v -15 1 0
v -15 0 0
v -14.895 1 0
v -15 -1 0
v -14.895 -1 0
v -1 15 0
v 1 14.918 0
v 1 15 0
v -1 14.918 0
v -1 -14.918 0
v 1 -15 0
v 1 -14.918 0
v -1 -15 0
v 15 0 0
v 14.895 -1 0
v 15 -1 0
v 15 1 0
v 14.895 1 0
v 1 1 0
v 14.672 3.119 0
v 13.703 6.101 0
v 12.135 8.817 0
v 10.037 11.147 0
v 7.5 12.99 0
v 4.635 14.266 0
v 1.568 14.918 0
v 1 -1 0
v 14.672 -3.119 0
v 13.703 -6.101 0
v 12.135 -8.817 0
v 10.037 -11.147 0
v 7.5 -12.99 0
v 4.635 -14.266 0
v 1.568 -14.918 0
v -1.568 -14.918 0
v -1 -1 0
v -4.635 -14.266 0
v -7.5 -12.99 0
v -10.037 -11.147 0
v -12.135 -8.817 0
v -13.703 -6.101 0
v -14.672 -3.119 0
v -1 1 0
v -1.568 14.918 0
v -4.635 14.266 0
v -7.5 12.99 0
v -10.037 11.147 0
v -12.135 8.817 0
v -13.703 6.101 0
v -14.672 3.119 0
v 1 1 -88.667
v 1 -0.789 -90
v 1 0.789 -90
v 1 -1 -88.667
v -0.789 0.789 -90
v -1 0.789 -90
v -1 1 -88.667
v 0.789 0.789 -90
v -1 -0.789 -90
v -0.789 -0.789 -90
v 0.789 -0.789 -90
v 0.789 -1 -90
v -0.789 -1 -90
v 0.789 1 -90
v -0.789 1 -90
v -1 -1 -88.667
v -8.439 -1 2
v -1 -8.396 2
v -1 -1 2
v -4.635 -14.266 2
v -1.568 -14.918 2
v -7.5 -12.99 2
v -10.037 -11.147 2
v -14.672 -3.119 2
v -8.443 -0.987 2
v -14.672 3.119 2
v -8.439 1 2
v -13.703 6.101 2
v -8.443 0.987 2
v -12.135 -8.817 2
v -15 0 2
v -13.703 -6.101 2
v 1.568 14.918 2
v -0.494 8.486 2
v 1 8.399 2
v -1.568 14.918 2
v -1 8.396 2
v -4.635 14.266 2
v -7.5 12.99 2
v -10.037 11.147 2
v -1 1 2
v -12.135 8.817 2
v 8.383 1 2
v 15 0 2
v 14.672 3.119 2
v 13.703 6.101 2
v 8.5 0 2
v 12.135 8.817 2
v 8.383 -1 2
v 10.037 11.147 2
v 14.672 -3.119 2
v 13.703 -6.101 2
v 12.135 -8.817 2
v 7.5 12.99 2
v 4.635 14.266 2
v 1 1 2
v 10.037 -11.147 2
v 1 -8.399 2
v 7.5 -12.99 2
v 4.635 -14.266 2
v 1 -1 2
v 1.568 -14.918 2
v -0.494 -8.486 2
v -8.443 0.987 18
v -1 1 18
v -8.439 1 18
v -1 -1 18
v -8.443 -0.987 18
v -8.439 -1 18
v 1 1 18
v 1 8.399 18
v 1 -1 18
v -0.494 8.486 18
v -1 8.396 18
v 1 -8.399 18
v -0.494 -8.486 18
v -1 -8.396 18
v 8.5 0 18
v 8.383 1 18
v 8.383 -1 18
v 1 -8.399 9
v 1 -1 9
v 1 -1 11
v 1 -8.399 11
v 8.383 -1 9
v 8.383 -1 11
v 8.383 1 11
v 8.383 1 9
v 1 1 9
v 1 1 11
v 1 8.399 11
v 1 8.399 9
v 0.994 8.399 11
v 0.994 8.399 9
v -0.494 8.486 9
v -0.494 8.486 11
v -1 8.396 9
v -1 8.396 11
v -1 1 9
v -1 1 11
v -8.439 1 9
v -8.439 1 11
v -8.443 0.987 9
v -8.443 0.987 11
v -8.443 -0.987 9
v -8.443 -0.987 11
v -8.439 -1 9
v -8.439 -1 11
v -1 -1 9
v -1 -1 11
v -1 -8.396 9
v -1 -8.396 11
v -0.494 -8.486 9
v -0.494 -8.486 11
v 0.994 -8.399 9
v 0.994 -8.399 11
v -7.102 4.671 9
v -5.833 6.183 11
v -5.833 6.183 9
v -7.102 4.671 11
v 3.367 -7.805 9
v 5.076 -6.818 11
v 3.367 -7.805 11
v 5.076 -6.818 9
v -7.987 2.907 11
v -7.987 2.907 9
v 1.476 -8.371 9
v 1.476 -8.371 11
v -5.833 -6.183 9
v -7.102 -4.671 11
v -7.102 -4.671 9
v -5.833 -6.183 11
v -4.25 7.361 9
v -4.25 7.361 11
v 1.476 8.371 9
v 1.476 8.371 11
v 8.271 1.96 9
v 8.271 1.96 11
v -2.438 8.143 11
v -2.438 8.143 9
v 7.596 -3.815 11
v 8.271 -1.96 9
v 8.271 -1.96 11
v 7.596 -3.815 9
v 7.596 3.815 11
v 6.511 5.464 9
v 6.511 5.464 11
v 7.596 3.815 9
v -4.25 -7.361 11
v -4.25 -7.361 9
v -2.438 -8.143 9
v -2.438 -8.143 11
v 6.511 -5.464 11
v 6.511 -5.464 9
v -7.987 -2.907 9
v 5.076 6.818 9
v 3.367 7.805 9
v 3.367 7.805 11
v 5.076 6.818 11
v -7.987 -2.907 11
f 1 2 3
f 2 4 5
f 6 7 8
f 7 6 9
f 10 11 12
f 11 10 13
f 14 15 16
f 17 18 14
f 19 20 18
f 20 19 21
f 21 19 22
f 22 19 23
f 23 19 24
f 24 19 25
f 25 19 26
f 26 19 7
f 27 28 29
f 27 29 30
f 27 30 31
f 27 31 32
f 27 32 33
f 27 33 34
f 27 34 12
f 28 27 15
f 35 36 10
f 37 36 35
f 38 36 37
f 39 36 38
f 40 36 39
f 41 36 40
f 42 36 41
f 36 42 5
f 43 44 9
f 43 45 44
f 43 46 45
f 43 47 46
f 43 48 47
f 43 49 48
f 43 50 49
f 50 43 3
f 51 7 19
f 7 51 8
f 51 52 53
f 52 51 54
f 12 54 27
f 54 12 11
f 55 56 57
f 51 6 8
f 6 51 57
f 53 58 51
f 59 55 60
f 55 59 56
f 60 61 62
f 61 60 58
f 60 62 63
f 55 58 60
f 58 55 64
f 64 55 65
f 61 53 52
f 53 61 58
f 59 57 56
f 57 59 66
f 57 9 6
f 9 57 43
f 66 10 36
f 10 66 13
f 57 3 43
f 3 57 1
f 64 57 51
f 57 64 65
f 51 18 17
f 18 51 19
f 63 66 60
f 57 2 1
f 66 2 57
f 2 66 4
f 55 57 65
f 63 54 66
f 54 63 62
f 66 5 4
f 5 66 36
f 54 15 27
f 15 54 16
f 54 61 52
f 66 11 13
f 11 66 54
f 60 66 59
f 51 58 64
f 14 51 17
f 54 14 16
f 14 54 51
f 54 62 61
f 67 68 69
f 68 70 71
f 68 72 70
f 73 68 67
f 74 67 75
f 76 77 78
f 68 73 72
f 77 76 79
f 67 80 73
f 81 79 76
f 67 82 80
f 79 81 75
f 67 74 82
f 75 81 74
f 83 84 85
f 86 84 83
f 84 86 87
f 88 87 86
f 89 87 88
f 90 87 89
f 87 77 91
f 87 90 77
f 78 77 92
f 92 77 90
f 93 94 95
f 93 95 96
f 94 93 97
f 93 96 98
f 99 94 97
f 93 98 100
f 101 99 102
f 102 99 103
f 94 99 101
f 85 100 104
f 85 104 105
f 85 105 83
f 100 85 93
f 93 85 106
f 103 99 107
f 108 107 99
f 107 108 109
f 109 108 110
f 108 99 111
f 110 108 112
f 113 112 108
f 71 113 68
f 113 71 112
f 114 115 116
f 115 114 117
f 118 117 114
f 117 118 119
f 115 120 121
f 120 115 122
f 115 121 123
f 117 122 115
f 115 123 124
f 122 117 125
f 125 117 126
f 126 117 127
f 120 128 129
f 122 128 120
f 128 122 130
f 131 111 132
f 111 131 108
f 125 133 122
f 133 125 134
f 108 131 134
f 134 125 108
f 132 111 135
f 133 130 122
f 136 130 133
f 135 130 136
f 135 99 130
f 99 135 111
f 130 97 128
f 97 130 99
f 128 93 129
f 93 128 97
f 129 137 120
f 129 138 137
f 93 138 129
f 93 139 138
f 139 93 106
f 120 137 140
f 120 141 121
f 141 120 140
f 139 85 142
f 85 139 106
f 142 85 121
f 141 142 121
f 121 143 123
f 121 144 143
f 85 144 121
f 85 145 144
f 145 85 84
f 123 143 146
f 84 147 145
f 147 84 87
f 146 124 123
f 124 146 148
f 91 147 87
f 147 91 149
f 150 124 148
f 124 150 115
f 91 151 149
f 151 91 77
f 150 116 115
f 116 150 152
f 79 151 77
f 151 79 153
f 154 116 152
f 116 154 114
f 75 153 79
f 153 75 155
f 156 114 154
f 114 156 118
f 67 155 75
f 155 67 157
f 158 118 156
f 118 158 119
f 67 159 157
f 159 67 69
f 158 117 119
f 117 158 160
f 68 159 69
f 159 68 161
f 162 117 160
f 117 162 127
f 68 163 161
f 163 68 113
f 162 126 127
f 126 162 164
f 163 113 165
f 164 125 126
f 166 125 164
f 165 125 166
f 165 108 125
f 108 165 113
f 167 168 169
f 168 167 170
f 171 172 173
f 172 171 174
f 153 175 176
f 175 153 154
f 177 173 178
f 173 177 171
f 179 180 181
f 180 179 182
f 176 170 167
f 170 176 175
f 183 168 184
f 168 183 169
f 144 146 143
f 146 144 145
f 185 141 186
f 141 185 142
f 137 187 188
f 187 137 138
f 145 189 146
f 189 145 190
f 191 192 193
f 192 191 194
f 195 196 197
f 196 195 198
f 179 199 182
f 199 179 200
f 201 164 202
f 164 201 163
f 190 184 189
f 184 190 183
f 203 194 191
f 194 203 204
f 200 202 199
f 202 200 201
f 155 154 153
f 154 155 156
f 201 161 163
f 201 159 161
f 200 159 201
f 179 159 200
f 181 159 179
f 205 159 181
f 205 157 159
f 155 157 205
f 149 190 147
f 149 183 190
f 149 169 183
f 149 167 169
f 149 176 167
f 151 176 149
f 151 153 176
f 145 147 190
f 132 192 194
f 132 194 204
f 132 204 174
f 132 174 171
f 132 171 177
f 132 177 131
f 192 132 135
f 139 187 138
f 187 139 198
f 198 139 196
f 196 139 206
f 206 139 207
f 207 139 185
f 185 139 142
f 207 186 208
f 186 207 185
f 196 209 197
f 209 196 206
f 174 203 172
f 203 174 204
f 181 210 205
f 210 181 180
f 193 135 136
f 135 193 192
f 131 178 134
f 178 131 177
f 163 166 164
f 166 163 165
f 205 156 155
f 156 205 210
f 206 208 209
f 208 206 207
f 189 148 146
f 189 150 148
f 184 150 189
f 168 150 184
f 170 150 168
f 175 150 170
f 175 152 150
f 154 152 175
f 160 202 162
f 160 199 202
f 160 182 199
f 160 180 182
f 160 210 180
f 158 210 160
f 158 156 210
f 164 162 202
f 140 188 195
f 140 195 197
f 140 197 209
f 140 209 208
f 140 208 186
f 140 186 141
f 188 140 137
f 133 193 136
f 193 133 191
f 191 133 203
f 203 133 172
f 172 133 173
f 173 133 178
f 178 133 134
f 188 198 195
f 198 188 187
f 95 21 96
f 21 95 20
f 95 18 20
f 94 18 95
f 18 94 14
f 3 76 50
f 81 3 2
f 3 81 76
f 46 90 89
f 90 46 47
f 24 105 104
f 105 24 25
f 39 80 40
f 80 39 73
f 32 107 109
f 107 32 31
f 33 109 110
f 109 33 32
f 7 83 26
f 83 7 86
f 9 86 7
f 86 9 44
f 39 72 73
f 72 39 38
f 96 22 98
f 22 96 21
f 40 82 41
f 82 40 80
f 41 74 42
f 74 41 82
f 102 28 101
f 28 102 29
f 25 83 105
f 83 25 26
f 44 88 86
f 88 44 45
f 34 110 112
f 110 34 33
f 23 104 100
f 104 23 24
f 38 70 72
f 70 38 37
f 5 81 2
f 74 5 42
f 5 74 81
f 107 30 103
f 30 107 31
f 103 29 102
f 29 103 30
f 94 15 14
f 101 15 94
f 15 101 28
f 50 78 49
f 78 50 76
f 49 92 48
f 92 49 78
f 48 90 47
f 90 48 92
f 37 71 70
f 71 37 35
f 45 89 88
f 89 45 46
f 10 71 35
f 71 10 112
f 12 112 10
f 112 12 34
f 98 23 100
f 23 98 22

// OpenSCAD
// how tall to make the top section
cap_riser_height = 16;
// the diameter of the top section
cap_riser_width = 17;
// how thick the top section's straight sections are (the + section)
cap_riser_thickness = 2;
// how far from the top to put the circular section of the top
cap_circle_offset = 9;

// how thick to make the circle dividing the point from the cap
cap_divider_thickness = 2;

// length of the stake's point
point_height = 95;
// radius of the top section of the stake
point_top_radius = 15;
// how much of the stake to cutoff, making it have a blunt edge
point_tip_cutoff = 5;
// how thick the stake's sections should be
point_thickness = 2;



/*****************
 The bottom pointy part
 */

module stake_edge(height, top_radius, tip_cutoff=10, thickness=2) {
  rotate([0, 90, 0])
    linear_extrude(height=thickness, center=true)
    difference() {
      // triangle
      polygon(points = [[0, 0], [0, top_radius], [height, 0]],
              paths=[[0, 1, 2]]);
    // the square for cutting off the tip
    translate([height - tip_cutoff, 0, 0]) {
      square([tip_cutoff, top_radius * 2]);
    }
  }
}

// all arguments expected to be in the same base syste
// final_radius should be about 5 (.5cm)
module stake_point(height, top_radius, tip_cutoff=10, thickness=2) {
  union() {
    stake_edge(height, top_radius, tip_cutoff, thickness);
    rotate(90) stake_edge(height, top_radius, tip_cutoff, thickness);
    rotate(180) stake_edge(height, top_radius, tip_cutoff, thickness);
    rotate(270) stake_edge(height, top_radius, tip_cutoff, thickness);
  }
}

module circle_at_top_of_point(radius, thickness) {
  linear_extrude(height=thickness)
    circle(r=radius);
}

/*****************
 The top section that the light goes on
 */

module cap_x_unrounded(width, thickness) {
    union() {
      translate([-width / 2.0, -thickness / 2.0])
        square([width, thickness], center=false);
      rotate([0, 0, 90])
        translate([-width / 2.0, -thickness / 2.0])
          square([width, thickness], center=false);
    }
}

module cap_x(riser_height, riser_width, riser_thickness) {
  linear_extrude(height=riser_height)
  // make a + but rounded off
  intersection() {
    cap_x_unrounded(riser_width, riser_thickness);
    circle(r=riser_width / 2.0);
  }
}

module cap_middle_circle(radius, thickness) {
  linear_extrude(height=thickness, center=false) circle(r=radius);
}

module cap_riser(riser_height, riser_width, cap_circle_offset, riser_thickness) {
  union() {
    cap_x(riser_height, riser_width, riser_thickness);
    translate([0, 0, riser_height - cap_circle_offset])
      cap_middle_circle(riser_width / 2.0, riser_thickness);
  }
}

module stake(point_height,
  point_top_radius,
  point_tip_cutoff,
  point_thickness,
  cap_divider_thickness,
  cap_riser_height,
  cap_riser_width,
  cap_riser_thickness,
  cap_circle_offset) {

  union() {
    stake_point(point_height, point_top_radius, point_tip_cutoff, point_thickness);
    circle_at_top_of_point(point_top_radius, cap_divider_thickness);

    translate([0, 0, cap_divider_thickness])
      cap_riser(cap_riser_height, cap_riser_width, cap_circle_offset, cap_riser_thickness);
  }
}

stake(point_height,
  point_top_radius,
  point_tip_cutoff,
  point_thickness,
  cap_divider_thickness,
  cap_riser_height,
  cap_riser_width,
  cap_riser_thickness,
  cap_circle_offset
);
